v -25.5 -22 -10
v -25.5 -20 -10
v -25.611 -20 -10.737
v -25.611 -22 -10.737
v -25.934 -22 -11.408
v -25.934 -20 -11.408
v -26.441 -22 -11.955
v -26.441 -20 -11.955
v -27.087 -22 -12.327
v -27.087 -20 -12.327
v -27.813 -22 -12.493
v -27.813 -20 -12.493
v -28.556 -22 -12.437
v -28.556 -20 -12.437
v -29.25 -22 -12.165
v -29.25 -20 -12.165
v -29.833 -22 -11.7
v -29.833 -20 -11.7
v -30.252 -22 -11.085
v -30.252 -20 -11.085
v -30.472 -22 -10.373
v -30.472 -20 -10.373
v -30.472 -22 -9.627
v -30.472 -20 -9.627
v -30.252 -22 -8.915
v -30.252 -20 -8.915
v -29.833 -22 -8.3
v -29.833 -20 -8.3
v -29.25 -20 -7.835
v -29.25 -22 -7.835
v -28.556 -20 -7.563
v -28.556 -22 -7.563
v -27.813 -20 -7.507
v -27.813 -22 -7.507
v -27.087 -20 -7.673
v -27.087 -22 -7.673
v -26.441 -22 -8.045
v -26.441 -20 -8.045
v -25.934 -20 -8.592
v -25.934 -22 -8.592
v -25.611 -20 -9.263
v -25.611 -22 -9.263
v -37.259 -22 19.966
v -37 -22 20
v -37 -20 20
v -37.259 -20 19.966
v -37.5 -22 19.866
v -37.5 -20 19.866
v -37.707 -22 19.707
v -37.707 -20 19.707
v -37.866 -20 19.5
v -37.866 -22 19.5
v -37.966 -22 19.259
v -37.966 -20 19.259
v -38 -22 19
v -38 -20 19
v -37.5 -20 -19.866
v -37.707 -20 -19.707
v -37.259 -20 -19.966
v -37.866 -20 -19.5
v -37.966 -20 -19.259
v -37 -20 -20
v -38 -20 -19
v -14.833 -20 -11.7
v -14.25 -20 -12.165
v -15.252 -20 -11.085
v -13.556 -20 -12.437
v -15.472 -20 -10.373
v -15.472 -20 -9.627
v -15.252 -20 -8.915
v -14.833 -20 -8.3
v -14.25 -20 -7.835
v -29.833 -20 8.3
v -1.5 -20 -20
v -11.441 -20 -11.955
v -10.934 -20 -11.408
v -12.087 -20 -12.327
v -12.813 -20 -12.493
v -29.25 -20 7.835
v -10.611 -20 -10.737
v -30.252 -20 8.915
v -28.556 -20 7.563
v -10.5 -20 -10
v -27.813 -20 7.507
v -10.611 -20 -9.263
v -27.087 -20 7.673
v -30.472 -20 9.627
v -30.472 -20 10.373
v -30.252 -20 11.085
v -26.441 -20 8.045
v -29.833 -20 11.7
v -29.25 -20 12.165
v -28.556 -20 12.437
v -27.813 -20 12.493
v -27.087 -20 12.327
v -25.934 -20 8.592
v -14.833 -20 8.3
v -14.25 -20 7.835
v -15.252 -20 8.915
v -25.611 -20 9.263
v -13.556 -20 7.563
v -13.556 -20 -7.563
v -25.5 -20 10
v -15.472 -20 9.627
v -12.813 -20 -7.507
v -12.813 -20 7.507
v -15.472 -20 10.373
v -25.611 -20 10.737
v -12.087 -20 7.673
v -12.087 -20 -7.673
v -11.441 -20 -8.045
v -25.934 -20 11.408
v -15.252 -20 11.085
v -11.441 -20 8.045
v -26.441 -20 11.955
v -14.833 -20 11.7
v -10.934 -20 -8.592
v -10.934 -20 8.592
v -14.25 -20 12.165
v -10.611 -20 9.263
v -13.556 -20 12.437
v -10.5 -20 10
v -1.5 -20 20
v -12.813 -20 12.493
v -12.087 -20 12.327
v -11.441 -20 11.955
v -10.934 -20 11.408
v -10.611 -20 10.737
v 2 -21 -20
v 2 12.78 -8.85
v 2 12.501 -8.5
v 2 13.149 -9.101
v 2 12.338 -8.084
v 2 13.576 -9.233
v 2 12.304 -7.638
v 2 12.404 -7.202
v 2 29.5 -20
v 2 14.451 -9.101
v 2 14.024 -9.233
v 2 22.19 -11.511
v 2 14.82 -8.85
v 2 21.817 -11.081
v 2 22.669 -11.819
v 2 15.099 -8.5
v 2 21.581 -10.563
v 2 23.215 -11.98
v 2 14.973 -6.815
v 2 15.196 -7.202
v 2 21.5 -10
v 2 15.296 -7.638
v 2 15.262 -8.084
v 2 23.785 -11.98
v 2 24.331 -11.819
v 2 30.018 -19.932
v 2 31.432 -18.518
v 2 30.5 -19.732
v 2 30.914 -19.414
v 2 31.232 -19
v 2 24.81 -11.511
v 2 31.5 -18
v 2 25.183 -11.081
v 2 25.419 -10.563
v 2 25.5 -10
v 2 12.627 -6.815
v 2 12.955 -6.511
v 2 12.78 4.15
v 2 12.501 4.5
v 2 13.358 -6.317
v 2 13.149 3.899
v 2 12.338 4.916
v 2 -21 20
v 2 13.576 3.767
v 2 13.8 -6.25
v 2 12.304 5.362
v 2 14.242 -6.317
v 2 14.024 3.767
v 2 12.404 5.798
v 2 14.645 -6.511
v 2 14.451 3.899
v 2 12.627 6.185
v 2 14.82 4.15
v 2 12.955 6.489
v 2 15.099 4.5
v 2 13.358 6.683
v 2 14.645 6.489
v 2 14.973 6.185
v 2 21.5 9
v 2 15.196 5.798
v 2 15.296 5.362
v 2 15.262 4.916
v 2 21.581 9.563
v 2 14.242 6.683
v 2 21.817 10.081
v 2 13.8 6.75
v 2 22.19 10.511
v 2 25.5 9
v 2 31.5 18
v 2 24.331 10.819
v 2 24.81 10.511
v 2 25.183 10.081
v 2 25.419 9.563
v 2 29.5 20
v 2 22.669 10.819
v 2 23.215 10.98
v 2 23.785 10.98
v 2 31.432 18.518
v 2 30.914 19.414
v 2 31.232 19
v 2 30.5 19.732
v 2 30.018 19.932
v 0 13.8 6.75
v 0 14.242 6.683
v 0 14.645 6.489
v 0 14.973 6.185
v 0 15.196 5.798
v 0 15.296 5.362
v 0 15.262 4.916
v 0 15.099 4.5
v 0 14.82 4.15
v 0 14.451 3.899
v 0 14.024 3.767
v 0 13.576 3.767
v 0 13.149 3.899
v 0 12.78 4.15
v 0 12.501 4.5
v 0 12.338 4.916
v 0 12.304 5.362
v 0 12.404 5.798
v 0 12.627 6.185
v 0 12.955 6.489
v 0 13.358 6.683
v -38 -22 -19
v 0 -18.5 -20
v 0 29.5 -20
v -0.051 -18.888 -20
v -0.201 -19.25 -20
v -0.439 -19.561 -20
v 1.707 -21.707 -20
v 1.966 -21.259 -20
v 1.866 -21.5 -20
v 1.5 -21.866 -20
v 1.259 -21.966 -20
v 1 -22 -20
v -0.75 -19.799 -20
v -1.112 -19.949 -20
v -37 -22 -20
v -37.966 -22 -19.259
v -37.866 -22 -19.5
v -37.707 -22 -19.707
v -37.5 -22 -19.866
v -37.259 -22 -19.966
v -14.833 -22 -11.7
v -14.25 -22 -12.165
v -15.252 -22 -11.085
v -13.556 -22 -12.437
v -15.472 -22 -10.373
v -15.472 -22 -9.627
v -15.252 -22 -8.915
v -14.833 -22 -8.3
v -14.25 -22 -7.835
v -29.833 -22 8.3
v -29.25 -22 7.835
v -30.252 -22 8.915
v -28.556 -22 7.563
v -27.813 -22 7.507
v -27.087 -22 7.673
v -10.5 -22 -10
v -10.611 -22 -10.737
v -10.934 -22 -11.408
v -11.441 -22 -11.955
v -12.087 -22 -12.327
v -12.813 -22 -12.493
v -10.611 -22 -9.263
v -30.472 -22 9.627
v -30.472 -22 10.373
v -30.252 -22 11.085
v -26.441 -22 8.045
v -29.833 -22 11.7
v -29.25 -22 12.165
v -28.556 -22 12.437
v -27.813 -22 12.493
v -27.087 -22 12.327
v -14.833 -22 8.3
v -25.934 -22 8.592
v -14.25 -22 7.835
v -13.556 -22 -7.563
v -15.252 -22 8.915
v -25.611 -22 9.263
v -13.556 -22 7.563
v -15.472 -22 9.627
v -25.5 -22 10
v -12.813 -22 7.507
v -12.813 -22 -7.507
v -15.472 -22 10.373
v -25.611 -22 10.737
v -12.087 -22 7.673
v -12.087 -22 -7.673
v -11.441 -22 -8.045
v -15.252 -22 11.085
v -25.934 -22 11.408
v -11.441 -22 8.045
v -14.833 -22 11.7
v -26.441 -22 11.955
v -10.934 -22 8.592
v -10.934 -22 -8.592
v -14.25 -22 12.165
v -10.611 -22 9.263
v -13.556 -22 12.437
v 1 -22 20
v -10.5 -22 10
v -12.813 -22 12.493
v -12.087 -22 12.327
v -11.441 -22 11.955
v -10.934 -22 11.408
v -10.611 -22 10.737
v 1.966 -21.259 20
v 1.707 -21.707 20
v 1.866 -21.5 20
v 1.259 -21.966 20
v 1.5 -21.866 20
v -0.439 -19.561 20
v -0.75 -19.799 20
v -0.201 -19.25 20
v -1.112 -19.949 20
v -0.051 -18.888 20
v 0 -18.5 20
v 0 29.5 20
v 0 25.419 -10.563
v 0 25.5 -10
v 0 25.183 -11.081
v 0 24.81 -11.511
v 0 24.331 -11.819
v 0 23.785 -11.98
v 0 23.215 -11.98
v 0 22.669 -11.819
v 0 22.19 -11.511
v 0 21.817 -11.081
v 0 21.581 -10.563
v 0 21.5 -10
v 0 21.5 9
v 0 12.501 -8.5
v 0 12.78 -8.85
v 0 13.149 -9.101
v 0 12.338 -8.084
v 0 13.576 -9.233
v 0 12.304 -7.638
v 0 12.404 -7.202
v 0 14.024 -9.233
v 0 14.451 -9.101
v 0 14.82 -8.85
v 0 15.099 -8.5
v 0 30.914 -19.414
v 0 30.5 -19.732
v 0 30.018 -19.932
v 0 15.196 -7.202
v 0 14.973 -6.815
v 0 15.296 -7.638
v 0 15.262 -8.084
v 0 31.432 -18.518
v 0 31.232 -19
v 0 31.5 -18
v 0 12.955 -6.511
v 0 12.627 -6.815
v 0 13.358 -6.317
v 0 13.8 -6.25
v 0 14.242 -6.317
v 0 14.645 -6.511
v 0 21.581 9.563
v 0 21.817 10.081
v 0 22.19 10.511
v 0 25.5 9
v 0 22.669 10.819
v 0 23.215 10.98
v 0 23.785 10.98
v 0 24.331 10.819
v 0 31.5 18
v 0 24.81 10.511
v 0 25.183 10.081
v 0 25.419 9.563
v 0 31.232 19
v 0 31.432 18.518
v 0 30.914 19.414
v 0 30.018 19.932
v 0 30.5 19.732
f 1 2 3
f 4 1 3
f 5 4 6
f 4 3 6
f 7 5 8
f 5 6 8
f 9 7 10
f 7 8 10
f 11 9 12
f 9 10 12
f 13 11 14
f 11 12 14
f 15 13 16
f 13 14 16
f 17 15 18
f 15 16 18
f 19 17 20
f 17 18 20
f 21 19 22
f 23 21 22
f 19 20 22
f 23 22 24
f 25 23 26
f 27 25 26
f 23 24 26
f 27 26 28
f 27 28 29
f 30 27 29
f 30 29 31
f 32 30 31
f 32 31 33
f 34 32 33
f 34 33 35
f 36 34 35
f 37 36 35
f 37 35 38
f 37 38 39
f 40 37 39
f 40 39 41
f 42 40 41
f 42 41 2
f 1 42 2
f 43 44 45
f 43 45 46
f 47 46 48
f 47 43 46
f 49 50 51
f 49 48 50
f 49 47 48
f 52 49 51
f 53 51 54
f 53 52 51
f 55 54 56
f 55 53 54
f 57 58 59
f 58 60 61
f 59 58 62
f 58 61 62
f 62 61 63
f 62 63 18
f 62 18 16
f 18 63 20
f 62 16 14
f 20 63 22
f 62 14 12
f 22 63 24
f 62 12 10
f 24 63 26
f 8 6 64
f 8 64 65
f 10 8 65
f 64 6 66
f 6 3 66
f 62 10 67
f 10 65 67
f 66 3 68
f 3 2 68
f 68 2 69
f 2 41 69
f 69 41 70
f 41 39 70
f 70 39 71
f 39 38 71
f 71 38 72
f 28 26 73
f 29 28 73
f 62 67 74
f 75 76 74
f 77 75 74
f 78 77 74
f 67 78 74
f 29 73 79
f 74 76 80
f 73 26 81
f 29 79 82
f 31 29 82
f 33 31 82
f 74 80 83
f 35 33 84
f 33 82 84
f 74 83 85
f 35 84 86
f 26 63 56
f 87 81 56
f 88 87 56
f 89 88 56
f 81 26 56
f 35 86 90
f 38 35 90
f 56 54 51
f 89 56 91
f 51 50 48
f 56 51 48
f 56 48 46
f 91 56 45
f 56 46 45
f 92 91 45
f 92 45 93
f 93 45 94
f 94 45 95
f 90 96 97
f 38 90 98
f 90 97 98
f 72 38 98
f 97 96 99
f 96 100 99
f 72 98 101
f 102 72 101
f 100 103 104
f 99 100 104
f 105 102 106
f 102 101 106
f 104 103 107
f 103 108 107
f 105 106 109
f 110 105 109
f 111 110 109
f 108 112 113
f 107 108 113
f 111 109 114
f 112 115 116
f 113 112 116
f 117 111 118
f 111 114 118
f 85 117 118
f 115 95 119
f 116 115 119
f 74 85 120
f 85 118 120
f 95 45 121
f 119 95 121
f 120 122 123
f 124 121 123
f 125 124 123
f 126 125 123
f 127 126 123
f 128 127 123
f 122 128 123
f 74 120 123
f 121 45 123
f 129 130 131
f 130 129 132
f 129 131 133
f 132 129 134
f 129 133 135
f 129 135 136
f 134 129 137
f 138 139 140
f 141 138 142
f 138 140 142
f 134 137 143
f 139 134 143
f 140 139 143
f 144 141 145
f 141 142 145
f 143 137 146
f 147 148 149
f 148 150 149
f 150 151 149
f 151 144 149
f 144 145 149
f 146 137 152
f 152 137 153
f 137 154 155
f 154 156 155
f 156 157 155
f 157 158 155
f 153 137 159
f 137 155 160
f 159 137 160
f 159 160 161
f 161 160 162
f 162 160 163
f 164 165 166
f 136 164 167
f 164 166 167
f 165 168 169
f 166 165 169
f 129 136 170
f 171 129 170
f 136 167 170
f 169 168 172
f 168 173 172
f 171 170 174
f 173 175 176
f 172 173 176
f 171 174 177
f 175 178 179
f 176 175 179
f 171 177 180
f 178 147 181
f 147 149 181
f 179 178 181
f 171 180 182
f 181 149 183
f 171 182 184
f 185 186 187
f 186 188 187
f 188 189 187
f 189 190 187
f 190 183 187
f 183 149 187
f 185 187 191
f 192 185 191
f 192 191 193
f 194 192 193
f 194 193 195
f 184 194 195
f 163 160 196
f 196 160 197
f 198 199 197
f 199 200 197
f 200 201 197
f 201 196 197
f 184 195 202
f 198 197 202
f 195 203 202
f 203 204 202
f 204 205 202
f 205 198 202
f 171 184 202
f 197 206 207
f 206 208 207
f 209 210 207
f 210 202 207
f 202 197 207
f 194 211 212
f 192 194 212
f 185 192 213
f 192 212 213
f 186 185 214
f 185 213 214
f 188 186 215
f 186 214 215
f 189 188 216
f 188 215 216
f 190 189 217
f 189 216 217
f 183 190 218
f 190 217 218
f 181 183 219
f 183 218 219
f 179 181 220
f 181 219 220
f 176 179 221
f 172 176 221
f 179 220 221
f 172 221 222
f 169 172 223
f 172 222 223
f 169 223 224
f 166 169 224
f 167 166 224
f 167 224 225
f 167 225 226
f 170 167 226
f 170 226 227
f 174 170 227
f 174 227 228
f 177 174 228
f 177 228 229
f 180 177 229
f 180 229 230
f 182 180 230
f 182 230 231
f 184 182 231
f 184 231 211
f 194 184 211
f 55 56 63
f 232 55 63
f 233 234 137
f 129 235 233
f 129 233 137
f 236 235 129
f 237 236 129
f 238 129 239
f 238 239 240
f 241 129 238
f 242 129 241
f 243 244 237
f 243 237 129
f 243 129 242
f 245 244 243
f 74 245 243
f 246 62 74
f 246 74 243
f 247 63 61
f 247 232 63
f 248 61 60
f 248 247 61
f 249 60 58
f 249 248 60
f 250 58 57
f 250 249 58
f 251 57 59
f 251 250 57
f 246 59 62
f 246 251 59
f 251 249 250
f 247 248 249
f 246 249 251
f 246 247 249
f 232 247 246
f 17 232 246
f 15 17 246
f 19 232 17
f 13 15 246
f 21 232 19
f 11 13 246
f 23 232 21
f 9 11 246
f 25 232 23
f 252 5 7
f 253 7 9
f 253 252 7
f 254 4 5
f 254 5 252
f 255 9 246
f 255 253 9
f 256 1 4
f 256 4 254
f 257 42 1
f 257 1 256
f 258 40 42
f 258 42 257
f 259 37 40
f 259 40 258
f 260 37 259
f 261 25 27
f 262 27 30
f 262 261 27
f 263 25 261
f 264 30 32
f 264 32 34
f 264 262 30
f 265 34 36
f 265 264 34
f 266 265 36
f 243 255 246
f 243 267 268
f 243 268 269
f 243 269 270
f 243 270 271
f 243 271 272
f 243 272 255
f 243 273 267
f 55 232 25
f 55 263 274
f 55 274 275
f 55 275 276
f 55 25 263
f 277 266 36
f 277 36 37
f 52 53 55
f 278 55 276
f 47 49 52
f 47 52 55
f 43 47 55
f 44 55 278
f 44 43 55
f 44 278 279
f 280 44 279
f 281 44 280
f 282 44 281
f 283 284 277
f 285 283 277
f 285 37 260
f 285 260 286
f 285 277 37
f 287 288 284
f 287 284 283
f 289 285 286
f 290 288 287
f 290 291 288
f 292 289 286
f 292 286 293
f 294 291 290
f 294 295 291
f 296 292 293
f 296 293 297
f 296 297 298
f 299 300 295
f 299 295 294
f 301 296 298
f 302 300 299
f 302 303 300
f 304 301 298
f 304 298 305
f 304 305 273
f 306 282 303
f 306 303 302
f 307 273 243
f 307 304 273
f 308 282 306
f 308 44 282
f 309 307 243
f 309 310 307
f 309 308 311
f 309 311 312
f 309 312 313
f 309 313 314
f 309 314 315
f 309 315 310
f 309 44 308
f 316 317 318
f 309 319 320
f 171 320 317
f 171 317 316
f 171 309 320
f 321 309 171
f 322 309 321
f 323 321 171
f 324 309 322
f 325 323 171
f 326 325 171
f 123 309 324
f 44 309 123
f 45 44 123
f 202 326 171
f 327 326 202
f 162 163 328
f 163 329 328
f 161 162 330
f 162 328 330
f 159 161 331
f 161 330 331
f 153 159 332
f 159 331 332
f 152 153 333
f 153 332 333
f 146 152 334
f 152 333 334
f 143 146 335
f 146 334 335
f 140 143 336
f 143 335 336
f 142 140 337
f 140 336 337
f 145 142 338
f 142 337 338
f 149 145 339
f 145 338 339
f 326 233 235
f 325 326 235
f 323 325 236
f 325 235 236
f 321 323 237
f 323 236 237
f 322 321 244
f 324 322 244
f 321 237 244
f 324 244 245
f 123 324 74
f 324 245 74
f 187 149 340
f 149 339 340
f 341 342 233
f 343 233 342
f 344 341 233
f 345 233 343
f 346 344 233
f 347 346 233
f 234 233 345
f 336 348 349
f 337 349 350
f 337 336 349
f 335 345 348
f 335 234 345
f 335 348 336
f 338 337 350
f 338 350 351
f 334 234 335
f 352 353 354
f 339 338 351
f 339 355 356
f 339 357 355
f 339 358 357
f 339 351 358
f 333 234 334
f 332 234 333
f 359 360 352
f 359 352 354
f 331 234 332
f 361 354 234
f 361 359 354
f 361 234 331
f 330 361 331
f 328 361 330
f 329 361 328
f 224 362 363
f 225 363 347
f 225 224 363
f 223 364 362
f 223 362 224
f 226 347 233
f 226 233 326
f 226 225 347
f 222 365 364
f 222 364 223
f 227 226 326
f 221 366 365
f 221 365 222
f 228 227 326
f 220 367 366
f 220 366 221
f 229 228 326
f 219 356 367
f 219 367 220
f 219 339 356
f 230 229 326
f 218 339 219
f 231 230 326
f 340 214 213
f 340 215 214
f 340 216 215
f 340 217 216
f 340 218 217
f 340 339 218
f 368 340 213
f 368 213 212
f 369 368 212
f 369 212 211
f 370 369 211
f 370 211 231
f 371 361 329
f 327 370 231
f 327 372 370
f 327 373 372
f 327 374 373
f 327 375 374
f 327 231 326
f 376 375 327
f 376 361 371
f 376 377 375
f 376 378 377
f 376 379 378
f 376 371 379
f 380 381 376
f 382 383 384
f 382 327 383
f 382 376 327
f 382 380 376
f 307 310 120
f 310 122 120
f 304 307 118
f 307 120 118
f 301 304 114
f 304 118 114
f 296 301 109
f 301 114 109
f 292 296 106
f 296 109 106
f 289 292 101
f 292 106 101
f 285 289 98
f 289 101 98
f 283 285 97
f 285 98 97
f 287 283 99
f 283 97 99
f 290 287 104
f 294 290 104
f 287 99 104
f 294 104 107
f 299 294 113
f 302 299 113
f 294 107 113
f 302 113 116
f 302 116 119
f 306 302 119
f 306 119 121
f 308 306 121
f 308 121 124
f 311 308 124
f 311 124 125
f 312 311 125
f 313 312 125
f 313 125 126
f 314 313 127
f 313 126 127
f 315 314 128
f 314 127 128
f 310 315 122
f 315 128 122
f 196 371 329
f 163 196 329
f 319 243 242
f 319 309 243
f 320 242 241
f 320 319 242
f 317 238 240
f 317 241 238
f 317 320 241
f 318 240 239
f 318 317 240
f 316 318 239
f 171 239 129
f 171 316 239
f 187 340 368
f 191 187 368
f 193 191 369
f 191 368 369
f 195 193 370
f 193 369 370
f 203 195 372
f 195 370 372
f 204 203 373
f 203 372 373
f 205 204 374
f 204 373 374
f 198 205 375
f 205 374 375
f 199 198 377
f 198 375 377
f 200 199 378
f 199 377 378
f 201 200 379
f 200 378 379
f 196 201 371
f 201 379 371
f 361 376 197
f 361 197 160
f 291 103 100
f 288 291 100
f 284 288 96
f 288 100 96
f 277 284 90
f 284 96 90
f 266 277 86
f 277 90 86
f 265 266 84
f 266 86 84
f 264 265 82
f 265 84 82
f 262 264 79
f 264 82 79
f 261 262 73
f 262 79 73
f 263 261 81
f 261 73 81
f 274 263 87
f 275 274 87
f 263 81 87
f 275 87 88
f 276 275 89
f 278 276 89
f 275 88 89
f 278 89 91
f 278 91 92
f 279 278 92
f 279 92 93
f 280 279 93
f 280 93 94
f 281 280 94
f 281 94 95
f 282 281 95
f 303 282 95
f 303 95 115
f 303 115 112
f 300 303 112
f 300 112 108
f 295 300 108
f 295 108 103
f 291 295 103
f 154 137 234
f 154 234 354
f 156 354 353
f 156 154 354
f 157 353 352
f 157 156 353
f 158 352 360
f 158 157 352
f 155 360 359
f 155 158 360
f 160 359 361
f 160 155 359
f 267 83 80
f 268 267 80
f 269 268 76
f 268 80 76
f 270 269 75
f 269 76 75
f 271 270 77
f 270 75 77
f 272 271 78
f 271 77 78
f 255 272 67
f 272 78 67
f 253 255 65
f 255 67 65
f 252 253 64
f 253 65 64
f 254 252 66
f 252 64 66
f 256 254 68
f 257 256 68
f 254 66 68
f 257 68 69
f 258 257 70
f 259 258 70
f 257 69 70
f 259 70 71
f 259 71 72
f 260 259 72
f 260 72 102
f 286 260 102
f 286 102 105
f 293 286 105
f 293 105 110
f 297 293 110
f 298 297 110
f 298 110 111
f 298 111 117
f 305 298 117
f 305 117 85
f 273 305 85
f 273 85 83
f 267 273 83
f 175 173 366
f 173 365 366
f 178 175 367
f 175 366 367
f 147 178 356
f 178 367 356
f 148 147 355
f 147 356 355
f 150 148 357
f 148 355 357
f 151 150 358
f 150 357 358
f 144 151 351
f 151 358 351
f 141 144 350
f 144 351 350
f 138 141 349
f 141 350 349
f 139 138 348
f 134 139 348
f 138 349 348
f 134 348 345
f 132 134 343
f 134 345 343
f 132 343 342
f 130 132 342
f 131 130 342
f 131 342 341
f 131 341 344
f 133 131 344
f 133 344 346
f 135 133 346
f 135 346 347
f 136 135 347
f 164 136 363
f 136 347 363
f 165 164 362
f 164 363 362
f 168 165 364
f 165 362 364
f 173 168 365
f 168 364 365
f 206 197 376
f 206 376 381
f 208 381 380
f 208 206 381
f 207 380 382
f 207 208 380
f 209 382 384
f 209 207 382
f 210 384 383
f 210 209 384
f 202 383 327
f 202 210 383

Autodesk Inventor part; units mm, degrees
ref_plane "YZ Plane" through (0, 0, 0) normal (1, 0, 0) x (0, 1, 0)
ref_plane "XZ Plane" through (0, 0, 0) normal (0, 1, 0) x (-1, 0, 0)
ref_plane "XY Plane" through (0, 0, 0) normal (0, 0, 1) x (1, 0, 0)
sketch "Boceto1" plane through (0, 0, 0) normal (1, 0, 0) x (0, 1, 0)
  line L0 (-6.321, 6.321) -> (6.321, 6.321) construction
  line L1 (6.321, 6.321) -> (6.321, -6.321) construction
  line L2 (6.321, -6.321) -> (-6.321, -6.321) construction
  line L3 (-6.321, -6.321) -> (-6.321, 6.321) construction
  line L4 (-6.321, 6.321) -> (6.321, -6.321) construction
  line L5 (6.321, 6.321) -> (-6.321, -6.321) construction
  circle A0 centre (6.321, -6.321) radius 0.875
  line L6 (0, 0) -> (7.9878, 0) construction
  circle A1 centre (6.321, 6.321) radius 0.875
  line L7 (0, 0) -> (0, -13.4562) construction
  circle A2 centre (-6.321, -6.321) radius 0.875
  circle A3 centre (-6.321, 6.321) radius 0.875
  circle A4 centre (0, 0) radius 5.5
  line L8 (10, 20) -> (-20, 20)
  line L9 (-20, 20) -> (-20, -20)
  line L10 (-20, -20) -> (10, -20)
  line L11 (10, -20) -> (10, 20)
  dimension "d0" = 12.642
  dimension "d1" = 12.642
  dimension "d2" = 1.75
  dimension "d3" = 11
  dimension "d4" = 30
  dimension "d6" = 20
  dimension "d7" = 10
  dimension "d26" = 20
extrude "Extrusión1" add sketch "Boceto1" along normal blind 2
sketch "Boceto2" plane through (0, -20, -20) normal (0, -1, 0) x (1, 0, 0)
  line L0 (2, 0) -> (2, 40) projected
  line L1 (2, 40) -> (-38, 40)
  line L2 (-38, 40) -> (-38, 0)
  line L3 (-38, 0) -> (2, 0)
  line L4 (2, 0) -> (2, 40)
  point P0 (0, 20)
  point P1 (2, 0)
  dimension "d10" = 40
  dimension "d11" = 40
extrude "Extrusión2" add sketch "Boceto2" along normal blind 2
fillet "Empalme1" radius 1.5 1 edges at (0, -20, 0)
fillet "Empalme2" radius 1 5 edges at (1, 10, 20) (1, 10, -20) (-38, -21, 20) (-38, -21, -20) (2, -22, 0)
sketch "Boceto4" plane through (0, -20, -20) normal (0, 1, 0) x (1, 0, 0)
  circle A0 centre (-13, -10) radius 2.5
  circle A1 centre (-13, -30) radius 2.5
  circle A2 centre (-28, -10) radius 2.5
  circle A3 centre (-28, -30) radius 2.5
  line L0 (-1.5, -40) -> (-37, -40) projected
  line L1 (-38, -39) -> (-38, -1) projected
  point P0 (0, -20)
  dimension "d27" = 5
  dimension "d28" = 5
  dimension "d29" = 5
  dimension "d30" = 5
  dimension "d31" = 10
  dimension "d32" = 20
  dimension "d33" = 20
  dimension "d34" = 15
  dimension "d35" = 10
extrude "Extrusión4" cut sketch "Boceto4" against normal through all
sketch "Boceto5" plane through (2, 0, 0) normal (1, 0, 0) x (0, 0, -1)
  line L0 (20, -21) -> (-20, -21) projected
  line L1 (20, 9) -> (20, -21) projected
  arc A0 (20, 9) -> (19, 10) centre (19, 9) ccw projected
  line L2 (19, 10) -> (-19, 10) projected
  arc A1 (-19, 10) -> (-20, 9) centre (-19, 9) ccw projected
  line L3 (-20, 9) -> (-20, -21) projected
  circle A2 centre (0, 0) radius 5.5 projected
  circle A3 centre (-6.321, -6.321) radius 0.875 projected
  circle A4 centre (6.321, -6.321) radius 0.875 projected
  circle A5 centre (-6.321, 6.321) radius 0.875 projected
  circle A6 centre (6.321, 6.321) radius 0.875 projected
extrude "Extrusión5" add sketch "Boceto5" against normal blind 2 contours A2 | A3 | A4 | A5 | A6
sketch "Boceto7" plane through (0, 0, 0) normal (-1, 0, 0) x (0, 0, 1)
  arc A0 (-19, 10) -> (-20, 9) centre (-19, 9) ccw projected
  line L0 (-20, -18.5) -> (-20, 9) projected
  line L1 (20, -18.5) -> (-20, -18.5) projected
  line L2 (20, 9) -> (20, -18.5) projected
  arc A1 (20, 9) -> (19, 10) centre (19, 9) ccw projected
  line L3 (-19, 10) -> (19, 10) projected
  line L4 (-20, -18.5) -> (20, -18.5)
  line L5 (20, -18.5) -> (20, 31.5)
  line L6 (20, 31.5) -> (-20, 31.5)
  line L7 (-20, 31.5) -> (-20, -18.5)
  point P0 (0, 0)
  dimension "d42" = 40
  dimension "d43" = 50
extrude "Extrusión7" add sketch "Boceto7" against normal blind 2 contours A0 L7 L6 L5 A1 L3
fillet "Empalme3" radius 2 2 edges at (1, 31.5, -20) (1, 31.5, 20)
sketch "Boceto8" plane through (0, 0, 0) normal (-1, 0, 0) x (0, 0, 1)
  line L0 (-18, 31.5) -> (18, 31.5) construction
  line L1 (0, 31.5) -> (0, 13.8) construction
  line L2 (-20, -18.5) -> (-20, 29.5) construction
  line L3 (-20, 13.8) -> (19.9852, 13.8) construction
  line L4 (-20, 13.8) -> (-7.75, 13.8) construction
  circle A0 centre (-7.75, 13.8) radius 1.5
  circle A1 centre (5.25, 13.8) radius 1.5
  point P0 (0, 0)
  dimension "d47" = 17.7
  dimension "d48" = 12.25
  dimension "d49" = 3
  dimension "d50" = 3
  dimension "d51" = 13
extrude "Extrusión8" cut sketch "Boceto8" against normal blind 2
sketch "Boceto9" plane through (0, 0, 0) normal (-1, 0, 0) x (0, 0, 1)
  line L0 (-10, 23.5) -> (9, 23.5)
  line L1 (18, 31.5) -> (-18, 31.5) projected
  line L2 (9, 23.5) -> (-10, 23.5) construction
  line L3 (9, 25.5) -> (-10, 25.5)
  line L4 (-10, 21.5) -> (9, 21.5)
  arc A0 (9, 21.5) -> (9, 25.5) centre (9, 23.5) ccw
  arc A1 (-10, 25.5) -> (-10, 21.5) centre (-10, 23.5) ccw
  line L5 (-20, -18.5) -> (-20, 29.5) projected
  point P0 (0, 0)
  point P1 (0, 31.5)
  point P2 (0, 31.5)
  point P3 (-0.5, 23.5)
  dimension "d56" = 8
  dimension "d57" = 9
  dimension "d58" = 10
  dimension "d59" = 4
extrude "Extrusión9" cut sketch "Boceto9" against normal blind 2
sketch "Boceto11" plane through (0, 0, 0) normal (-1, 0, 0) x (0, 0, 1)
  circle A0 centre (0, 0) radius 5.5 projected
  circle A1 centre (5.25, 13.8) radius 1.5 projected
  dimension "d64" = 13.8
sketch "Boceto3" plane through (0, -20, -20) normal (0, 1, 0) x (1, 0, 0)
  line L0 (0, -40) -> (0, 0) projected
  line L1 (-28, 0) -> (0, 0) projected
  line L2 (-28, -40) -> (-28, 0) projected
  line L3 (0, -40) -> (-28, -40) projected
  line L4 (-6.125, -3.125) -> (-6.125, -36.875) construction
  line L5 (-7.25, -3.125) -> (-7.25, -36.875)
  line L6 (-5, -36.875) -> (-5, -3.125)
  arc A0 (-5, -3.125) -> (-7.25, -3.125) centre (-6.125, -3.125) ccw
  arc A1 (-7.25, -36.875) -> (-5, -36.875) centre (-6.125, -36.875) ccw
  line L7 (-21.875, -3.125) -> (-21.875, -36.875) construction
  line L8 (-23, -3.125) -> (-23, -36.875)
  line L9 (-20.75, -36.875) -> (-20.75, -3.125)
  arc A2 (-20.75, -3.125) -> (-23, -3.125) centre (-21.875, -3.125) ccw
  arc A3 (-23, -36.875) -> (-20.75, -36.875) centre (-21.875, -36.875) ccw
  point P0 (0, -20)
  point P1 (-6.125, -20)
  point P2 (-21.875, -20)
  point P3 (-21.875, -38)
  point P4 (-21.875, -2)
  point P5 (-6.125, -38)
  point P6 (-6.125, -2)
  dimension "d14" = 2.25
  dimension "d15" = 2.25
  dimension "d16" = 5
  dimension "d17" = 2
  dimension "d18" = 2
  dimension "d19" = 2
  dimension "d20" = 2
  dimension "d21" = 5
equation "\"Radio_pliegue\" = Grosor"
equation "\"Anchura_desahogo_plegado\" = Grosor"
equation "\"Profundidad_desahogo_plegado\" = 0.5 * Grosor"
equation "\"Tamaño_destalonado\" = 4 * Grosor"
equation "\"Remanente_mínimo\" = 2 * Grosor"
equation "\"Radiodetransición\" = Radio_pliegue"
equation "\"Tamaño_de_radio_de_Jacobi\" = Radio_pliegue"
equation "\"TamañoSeparación\" = Grosor"
equation "\"Grosor\" = 2"
properties part number "BRACKET_SENSOR" material "Aluminio 6061"
